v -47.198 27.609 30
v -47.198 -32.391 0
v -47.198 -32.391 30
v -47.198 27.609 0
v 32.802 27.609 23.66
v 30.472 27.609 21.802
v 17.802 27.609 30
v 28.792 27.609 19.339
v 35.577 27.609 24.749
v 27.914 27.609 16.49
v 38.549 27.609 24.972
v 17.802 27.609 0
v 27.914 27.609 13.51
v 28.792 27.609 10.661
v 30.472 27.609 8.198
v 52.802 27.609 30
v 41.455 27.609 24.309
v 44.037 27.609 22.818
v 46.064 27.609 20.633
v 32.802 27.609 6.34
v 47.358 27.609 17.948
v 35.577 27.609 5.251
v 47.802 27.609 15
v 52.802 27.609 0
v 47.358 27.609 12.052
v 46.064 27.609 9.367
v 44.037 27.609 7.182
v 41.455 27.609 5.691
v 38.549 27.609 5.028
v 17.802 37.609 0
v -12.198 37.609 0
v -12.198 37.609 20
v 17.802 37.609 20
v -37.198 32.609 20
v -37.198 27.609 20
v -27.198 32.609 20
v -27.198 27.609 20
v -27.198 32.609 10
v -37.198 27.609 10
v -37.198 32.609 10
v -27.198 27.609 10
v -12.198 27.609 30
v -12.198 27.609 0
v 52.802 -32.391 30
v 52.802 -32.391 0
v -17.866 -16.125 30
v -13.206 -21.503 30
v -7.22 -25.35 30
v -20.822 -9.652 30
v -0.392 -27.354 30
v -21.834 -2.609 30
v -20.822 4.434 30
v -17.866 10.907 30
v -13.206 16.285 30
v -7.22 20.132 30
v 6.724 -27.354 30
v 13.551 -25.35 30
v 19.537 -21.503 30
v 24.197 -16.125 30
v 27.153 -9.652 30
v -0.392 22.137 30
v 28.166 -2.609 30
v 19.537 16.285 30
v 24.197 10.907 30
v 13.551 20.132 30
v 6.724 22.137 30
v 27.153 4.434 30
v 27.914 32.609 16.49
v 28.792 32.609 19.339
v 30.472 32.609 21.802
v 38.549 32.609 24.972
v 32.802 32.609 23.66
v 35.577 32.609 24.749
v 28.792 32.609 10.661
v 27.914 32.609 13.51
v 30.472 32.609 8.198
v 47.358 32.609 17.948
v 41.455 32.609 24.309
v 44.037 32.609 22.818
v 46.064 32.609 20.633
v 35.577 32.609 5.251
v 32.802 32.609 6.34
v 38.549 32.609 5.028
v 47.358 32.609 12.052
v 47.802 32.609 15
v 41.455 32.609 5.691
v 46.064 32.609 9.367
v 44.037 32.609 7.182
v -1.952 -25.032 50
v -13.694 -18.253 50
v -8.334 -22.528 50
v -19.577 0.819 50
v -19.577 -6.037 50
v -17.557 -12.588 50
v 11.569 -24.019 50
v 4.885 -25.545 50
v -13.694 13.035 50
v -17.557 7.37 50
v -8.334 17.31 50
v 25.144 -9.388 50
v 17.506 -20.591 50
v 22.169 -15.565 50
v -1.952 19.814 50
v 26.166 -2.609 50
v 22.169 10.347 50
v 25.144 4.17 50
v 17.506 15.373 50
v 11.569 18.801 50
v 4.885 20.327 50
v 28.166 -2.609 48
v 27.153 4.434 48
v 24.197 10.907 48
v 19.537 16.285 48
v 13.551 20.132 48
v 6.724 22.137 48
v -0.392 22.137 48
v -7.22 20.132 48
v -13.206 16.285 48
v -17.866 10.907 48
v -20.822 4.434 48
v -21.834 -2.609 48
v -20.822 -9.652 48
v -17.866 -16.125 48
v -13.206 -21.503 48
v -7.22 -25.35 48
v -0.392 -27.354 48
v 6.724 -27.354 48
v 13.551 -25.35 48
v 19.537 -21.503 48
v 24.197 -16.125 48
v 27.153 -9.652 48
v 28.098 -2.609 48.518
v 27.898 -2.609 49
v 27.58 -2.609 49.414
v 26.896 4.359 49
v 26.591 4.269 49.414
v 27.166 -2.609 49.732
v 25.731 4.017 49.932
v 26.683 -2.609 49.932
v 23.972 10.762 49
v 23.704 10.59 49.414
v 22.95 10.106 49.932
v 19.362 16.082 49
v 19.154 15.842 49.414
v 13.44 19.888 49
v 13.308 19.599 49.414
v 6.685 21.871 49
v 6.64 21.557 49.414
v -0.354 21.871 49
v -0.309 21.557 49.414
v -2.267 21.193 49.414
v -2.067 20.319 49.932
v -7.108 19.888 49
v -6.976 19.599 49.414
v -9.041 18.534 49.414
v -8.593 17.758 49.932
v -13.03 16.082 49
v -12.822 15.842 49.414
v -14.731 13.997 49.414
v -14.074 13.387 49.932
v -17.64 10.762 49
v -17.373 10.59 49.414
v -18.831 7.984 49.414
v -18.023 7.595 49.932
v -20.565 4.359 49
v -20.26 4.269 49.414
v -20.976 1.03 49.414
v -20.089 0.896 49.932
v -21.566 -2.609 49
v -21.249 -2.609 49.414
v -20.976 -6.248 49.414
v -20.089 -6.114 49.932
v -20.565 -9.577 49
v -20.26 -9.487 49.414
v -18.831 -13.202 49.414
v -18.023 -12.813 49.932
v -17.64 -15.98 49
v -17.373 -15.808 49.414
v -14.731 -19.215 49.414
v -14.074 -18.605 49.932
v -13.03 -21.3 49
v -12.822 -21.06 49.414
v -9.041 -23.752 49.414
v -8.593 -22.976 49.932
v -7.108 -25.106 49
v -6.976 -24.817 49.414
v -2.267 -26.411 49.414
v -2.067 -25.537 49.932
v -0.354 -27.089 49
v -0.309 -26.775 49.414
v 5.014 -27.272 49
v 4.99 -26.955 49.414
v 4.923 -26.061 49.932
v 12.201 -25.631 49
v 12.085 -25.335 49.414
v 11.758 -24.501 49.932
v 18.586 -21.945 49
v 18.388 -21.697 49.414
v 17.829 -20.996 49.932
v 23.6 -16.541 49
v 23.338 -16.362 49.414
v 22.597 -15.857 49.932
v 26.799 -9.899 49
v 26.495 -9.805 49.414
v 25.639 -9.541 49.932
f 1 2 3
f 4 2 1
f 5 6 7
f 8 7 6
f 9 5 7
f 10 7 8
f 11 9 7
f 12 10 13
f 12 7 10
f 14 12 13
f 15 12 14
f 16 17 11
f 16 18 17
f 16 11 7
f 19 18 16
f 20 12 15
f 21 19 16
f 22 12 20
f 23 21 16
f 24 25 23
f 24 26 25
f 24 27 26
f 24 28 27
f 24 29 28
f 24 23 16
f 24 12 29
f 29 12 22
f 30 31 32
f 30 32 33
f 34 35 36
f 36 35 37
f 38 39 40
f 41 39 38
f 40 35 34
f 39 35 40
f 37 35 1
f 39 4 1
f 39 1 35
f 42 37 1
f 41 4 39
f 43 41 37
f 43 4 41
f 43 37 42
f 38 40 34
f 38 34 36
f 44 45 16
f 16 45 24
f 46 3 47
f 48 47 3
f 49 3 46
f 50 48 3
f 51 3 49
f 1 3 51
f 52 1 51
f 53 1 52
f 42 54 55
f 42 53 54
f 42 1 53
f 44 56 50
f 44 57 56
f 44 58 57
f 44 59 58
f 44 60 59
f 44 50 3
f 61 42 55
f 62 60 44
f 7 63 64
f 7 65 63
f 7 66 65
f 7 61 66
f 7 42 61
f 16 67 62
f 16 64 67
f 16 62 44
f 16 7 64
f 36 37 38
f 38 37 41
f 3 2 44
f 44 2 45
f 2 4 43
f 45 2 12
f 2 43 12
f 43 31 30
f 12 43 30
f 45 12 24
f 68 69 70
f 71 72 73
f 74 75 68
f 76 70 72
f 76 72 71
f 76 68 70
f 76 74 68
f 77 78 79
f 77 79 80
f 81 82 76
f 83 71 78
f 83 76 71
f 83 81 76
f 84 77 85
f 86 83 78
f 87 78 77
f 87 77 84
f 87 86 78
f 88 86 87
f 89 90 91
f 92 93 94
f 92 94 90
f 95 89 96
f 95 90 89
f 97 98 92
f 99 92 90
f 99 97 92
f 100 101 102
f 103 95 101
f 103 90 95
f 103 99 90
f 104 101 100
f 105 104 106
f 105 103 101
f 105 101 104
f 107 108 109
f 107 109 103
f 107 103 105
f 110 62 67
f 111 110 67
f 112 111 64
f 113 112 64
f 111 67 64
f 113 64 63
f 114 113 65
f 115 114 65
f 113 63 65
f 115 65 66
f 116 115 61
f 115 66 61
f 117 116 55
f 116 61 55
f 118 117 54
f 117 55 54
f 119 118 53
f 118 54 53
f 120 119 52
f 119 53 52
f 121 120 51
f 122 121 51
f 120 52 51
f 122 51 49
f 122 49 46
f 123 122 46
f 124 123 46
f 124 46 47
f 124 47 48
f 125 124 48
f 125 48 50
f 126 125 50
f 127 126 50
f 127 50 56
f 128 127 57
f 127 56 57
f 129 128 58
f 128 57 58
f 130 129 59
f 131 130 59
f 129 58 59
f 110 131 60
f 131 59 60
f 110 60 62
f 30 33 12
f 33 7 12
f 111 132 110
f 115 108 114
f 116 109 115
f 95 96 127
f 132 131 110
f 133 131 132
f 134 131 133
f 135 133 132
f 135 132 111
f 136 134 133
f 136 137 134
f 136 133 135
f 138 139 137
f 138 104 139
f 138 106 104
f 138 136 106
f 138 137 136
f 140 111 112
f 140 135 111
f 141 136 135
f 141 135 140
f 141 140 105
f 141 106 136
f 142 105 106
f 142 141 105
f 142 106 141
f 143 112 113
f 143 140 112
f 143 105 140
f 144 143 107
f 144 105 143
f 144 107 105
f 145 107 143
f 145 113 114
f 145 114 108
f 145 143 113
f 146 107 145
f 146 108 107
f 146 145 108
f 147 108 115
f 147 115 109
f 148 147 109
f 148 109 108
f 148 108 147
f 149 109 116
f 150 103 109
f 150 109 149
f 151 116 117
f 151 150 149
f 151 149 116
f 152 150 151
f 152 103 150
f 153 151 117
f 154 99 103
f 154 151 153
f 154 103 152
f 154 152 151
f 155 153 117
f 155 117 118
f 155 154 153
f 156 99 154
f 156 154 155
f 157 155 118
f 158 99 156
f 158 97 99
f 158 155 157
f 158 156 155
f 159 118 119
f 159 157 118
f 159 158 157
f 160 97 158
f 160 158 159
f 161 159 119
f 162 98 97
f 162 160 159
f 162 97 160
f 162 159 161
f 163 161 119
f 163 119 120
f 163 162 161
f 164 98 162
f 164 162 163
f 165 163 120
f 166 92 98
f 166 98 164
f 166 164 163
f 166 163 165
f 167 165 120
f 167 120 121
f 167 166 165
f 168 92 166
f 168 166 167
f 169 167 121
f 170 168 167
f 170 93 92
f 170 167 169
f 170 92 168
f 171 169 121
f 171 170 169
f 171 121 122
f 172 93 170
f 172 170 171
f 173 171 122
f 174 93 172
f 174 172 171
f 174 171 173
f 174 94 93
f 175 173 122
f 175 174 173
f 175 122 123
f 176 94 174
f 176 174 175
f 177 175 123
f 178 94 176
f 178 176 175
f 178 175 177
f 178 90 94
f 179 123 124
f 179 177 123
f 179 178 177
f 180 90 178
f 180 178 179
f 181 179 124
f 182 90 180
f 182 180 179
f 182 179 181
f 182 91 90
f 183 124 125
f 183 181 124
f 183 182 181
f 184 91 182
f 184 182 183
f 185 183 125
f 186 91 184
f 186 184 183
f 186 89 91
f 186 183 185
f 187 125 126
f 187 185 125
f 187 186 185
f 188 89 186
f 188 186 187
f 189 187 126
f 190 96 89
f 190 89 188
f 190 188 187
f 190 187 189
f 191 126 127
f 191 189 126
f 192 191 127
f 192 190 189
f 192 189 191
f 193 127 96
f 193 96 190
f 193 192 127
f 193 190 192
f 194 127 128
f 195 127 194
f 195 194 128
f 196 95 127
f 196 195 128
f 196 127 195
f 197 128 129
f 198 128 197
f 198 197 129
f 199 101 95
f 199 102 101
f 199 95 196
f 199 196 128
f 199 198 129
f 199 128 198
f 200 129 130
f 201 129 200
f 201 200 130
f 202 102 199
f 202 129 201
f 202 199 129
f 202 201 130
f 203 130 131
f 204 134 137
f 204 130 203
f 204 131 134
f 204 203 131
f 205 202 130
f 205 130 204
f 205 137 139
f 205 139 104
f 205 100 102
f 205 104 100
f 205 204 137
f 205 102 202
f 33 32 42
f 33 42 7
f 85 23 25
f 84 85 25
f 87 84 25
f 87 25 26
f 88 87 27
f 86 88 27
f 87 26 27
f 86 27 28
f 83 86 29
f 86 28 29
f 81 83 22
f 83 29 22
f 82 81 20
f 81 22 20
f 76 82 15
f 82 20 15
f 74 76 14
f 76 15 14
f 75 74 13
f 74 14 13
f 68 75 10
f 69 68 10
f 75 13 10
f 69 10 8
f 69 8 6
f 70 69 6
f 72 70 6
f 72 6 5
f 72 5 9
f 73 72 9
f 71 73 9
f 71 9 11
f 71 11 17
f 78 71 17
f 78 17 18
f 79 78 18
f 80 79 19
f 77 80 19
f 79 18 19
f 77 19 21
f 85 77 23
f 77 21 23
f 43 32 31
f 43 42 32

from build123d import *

# Parameters (mm, degrees)
SKETCH2_W           = 100
SKETCH2_H           = 60
BOSS_EXTRUDE1_DEPTH = 30
SKETCH4_R           = 25
BOSS_EXTRUDE2_DEPTH = 20
SKETCH6_R           = 10
SKETCH6_W           = 10
SKETCH6_H           = 10
BOSS_EXTRUDE3_DEPTH = 5
SKETCH8_W           = 30
SKETCH8_H           = 30
BOSS_EXTRUDE4_DEPTH = 10
CHAMFER2_SIZE       = 10
FILLET1_R           = 2


with BuildPart() as part:
    # Sketch2 → Boss-Extrude1 (new body)
    with BuildSketch(Plane.XY):
        with Locations((2.802056555, -2.390745501)):
            Rectangle(SKETCH2_W, SKETCH2_H)
    extrude(amount=BOSS_EXTRUDE1_DEPTH)

    # Sketch4 → Boss-Extrude2 (add)
    with BuildSketch(Plane.XY.offset(30)):
        with Locations((3.165713288, -2.608939541)):
            Circle(SKETCH4_R)
    extrude(amount=BOSS_EXTRUDE2_DEPTH)

    # Sketch6 → Boss-Extrude3 (add)
    with BuildSketch(Plane(origin=(0, 27.609254499, 0), x_dir=(1, 0, 0), z_dir=(0, 1, 0))):
        with Locations((37.802056555, -15)):
            Circle(SKETCH6_R)
        with Locations((-32.197943445, -15)):
            Rectangle(SKETCH6_W, SKETCH6_H)
    extrude(amount=BOSS_EXTRUDE3_DEPTH)

    # Sketch8 → Boss-Extrude4 (add)
    with BuildSketch(Plane(origin=(0, 27.609254499, 0), x_dir=(1, 0, 0), z_dir=(0, 1, 0))):
        with Locations((2.802056555, -15)):
            Rectangle(SKETCH8_W, SKETCH8_H)
    extrude(amount=BOSS_EXTRUDE4_DEPTH)

    # Chamfer2
    chamfer2_edges = [part.edges().sort_by_distance(p)[0] for p in [
        (2.802056555, 37.609254499, 30),
    ]]
    chamfer(chamfer2_edges, length=CHAMFER2_SIZE)

    # Fillet1
    fillet1_edges = [part.edges().sort_by_distance(p)[0] for p in [
        (-21.834286712, -2.608939541, 50),
    ]]
    fillet(fillet1_edges, radius=FILLET1_R)


solid = part.part
